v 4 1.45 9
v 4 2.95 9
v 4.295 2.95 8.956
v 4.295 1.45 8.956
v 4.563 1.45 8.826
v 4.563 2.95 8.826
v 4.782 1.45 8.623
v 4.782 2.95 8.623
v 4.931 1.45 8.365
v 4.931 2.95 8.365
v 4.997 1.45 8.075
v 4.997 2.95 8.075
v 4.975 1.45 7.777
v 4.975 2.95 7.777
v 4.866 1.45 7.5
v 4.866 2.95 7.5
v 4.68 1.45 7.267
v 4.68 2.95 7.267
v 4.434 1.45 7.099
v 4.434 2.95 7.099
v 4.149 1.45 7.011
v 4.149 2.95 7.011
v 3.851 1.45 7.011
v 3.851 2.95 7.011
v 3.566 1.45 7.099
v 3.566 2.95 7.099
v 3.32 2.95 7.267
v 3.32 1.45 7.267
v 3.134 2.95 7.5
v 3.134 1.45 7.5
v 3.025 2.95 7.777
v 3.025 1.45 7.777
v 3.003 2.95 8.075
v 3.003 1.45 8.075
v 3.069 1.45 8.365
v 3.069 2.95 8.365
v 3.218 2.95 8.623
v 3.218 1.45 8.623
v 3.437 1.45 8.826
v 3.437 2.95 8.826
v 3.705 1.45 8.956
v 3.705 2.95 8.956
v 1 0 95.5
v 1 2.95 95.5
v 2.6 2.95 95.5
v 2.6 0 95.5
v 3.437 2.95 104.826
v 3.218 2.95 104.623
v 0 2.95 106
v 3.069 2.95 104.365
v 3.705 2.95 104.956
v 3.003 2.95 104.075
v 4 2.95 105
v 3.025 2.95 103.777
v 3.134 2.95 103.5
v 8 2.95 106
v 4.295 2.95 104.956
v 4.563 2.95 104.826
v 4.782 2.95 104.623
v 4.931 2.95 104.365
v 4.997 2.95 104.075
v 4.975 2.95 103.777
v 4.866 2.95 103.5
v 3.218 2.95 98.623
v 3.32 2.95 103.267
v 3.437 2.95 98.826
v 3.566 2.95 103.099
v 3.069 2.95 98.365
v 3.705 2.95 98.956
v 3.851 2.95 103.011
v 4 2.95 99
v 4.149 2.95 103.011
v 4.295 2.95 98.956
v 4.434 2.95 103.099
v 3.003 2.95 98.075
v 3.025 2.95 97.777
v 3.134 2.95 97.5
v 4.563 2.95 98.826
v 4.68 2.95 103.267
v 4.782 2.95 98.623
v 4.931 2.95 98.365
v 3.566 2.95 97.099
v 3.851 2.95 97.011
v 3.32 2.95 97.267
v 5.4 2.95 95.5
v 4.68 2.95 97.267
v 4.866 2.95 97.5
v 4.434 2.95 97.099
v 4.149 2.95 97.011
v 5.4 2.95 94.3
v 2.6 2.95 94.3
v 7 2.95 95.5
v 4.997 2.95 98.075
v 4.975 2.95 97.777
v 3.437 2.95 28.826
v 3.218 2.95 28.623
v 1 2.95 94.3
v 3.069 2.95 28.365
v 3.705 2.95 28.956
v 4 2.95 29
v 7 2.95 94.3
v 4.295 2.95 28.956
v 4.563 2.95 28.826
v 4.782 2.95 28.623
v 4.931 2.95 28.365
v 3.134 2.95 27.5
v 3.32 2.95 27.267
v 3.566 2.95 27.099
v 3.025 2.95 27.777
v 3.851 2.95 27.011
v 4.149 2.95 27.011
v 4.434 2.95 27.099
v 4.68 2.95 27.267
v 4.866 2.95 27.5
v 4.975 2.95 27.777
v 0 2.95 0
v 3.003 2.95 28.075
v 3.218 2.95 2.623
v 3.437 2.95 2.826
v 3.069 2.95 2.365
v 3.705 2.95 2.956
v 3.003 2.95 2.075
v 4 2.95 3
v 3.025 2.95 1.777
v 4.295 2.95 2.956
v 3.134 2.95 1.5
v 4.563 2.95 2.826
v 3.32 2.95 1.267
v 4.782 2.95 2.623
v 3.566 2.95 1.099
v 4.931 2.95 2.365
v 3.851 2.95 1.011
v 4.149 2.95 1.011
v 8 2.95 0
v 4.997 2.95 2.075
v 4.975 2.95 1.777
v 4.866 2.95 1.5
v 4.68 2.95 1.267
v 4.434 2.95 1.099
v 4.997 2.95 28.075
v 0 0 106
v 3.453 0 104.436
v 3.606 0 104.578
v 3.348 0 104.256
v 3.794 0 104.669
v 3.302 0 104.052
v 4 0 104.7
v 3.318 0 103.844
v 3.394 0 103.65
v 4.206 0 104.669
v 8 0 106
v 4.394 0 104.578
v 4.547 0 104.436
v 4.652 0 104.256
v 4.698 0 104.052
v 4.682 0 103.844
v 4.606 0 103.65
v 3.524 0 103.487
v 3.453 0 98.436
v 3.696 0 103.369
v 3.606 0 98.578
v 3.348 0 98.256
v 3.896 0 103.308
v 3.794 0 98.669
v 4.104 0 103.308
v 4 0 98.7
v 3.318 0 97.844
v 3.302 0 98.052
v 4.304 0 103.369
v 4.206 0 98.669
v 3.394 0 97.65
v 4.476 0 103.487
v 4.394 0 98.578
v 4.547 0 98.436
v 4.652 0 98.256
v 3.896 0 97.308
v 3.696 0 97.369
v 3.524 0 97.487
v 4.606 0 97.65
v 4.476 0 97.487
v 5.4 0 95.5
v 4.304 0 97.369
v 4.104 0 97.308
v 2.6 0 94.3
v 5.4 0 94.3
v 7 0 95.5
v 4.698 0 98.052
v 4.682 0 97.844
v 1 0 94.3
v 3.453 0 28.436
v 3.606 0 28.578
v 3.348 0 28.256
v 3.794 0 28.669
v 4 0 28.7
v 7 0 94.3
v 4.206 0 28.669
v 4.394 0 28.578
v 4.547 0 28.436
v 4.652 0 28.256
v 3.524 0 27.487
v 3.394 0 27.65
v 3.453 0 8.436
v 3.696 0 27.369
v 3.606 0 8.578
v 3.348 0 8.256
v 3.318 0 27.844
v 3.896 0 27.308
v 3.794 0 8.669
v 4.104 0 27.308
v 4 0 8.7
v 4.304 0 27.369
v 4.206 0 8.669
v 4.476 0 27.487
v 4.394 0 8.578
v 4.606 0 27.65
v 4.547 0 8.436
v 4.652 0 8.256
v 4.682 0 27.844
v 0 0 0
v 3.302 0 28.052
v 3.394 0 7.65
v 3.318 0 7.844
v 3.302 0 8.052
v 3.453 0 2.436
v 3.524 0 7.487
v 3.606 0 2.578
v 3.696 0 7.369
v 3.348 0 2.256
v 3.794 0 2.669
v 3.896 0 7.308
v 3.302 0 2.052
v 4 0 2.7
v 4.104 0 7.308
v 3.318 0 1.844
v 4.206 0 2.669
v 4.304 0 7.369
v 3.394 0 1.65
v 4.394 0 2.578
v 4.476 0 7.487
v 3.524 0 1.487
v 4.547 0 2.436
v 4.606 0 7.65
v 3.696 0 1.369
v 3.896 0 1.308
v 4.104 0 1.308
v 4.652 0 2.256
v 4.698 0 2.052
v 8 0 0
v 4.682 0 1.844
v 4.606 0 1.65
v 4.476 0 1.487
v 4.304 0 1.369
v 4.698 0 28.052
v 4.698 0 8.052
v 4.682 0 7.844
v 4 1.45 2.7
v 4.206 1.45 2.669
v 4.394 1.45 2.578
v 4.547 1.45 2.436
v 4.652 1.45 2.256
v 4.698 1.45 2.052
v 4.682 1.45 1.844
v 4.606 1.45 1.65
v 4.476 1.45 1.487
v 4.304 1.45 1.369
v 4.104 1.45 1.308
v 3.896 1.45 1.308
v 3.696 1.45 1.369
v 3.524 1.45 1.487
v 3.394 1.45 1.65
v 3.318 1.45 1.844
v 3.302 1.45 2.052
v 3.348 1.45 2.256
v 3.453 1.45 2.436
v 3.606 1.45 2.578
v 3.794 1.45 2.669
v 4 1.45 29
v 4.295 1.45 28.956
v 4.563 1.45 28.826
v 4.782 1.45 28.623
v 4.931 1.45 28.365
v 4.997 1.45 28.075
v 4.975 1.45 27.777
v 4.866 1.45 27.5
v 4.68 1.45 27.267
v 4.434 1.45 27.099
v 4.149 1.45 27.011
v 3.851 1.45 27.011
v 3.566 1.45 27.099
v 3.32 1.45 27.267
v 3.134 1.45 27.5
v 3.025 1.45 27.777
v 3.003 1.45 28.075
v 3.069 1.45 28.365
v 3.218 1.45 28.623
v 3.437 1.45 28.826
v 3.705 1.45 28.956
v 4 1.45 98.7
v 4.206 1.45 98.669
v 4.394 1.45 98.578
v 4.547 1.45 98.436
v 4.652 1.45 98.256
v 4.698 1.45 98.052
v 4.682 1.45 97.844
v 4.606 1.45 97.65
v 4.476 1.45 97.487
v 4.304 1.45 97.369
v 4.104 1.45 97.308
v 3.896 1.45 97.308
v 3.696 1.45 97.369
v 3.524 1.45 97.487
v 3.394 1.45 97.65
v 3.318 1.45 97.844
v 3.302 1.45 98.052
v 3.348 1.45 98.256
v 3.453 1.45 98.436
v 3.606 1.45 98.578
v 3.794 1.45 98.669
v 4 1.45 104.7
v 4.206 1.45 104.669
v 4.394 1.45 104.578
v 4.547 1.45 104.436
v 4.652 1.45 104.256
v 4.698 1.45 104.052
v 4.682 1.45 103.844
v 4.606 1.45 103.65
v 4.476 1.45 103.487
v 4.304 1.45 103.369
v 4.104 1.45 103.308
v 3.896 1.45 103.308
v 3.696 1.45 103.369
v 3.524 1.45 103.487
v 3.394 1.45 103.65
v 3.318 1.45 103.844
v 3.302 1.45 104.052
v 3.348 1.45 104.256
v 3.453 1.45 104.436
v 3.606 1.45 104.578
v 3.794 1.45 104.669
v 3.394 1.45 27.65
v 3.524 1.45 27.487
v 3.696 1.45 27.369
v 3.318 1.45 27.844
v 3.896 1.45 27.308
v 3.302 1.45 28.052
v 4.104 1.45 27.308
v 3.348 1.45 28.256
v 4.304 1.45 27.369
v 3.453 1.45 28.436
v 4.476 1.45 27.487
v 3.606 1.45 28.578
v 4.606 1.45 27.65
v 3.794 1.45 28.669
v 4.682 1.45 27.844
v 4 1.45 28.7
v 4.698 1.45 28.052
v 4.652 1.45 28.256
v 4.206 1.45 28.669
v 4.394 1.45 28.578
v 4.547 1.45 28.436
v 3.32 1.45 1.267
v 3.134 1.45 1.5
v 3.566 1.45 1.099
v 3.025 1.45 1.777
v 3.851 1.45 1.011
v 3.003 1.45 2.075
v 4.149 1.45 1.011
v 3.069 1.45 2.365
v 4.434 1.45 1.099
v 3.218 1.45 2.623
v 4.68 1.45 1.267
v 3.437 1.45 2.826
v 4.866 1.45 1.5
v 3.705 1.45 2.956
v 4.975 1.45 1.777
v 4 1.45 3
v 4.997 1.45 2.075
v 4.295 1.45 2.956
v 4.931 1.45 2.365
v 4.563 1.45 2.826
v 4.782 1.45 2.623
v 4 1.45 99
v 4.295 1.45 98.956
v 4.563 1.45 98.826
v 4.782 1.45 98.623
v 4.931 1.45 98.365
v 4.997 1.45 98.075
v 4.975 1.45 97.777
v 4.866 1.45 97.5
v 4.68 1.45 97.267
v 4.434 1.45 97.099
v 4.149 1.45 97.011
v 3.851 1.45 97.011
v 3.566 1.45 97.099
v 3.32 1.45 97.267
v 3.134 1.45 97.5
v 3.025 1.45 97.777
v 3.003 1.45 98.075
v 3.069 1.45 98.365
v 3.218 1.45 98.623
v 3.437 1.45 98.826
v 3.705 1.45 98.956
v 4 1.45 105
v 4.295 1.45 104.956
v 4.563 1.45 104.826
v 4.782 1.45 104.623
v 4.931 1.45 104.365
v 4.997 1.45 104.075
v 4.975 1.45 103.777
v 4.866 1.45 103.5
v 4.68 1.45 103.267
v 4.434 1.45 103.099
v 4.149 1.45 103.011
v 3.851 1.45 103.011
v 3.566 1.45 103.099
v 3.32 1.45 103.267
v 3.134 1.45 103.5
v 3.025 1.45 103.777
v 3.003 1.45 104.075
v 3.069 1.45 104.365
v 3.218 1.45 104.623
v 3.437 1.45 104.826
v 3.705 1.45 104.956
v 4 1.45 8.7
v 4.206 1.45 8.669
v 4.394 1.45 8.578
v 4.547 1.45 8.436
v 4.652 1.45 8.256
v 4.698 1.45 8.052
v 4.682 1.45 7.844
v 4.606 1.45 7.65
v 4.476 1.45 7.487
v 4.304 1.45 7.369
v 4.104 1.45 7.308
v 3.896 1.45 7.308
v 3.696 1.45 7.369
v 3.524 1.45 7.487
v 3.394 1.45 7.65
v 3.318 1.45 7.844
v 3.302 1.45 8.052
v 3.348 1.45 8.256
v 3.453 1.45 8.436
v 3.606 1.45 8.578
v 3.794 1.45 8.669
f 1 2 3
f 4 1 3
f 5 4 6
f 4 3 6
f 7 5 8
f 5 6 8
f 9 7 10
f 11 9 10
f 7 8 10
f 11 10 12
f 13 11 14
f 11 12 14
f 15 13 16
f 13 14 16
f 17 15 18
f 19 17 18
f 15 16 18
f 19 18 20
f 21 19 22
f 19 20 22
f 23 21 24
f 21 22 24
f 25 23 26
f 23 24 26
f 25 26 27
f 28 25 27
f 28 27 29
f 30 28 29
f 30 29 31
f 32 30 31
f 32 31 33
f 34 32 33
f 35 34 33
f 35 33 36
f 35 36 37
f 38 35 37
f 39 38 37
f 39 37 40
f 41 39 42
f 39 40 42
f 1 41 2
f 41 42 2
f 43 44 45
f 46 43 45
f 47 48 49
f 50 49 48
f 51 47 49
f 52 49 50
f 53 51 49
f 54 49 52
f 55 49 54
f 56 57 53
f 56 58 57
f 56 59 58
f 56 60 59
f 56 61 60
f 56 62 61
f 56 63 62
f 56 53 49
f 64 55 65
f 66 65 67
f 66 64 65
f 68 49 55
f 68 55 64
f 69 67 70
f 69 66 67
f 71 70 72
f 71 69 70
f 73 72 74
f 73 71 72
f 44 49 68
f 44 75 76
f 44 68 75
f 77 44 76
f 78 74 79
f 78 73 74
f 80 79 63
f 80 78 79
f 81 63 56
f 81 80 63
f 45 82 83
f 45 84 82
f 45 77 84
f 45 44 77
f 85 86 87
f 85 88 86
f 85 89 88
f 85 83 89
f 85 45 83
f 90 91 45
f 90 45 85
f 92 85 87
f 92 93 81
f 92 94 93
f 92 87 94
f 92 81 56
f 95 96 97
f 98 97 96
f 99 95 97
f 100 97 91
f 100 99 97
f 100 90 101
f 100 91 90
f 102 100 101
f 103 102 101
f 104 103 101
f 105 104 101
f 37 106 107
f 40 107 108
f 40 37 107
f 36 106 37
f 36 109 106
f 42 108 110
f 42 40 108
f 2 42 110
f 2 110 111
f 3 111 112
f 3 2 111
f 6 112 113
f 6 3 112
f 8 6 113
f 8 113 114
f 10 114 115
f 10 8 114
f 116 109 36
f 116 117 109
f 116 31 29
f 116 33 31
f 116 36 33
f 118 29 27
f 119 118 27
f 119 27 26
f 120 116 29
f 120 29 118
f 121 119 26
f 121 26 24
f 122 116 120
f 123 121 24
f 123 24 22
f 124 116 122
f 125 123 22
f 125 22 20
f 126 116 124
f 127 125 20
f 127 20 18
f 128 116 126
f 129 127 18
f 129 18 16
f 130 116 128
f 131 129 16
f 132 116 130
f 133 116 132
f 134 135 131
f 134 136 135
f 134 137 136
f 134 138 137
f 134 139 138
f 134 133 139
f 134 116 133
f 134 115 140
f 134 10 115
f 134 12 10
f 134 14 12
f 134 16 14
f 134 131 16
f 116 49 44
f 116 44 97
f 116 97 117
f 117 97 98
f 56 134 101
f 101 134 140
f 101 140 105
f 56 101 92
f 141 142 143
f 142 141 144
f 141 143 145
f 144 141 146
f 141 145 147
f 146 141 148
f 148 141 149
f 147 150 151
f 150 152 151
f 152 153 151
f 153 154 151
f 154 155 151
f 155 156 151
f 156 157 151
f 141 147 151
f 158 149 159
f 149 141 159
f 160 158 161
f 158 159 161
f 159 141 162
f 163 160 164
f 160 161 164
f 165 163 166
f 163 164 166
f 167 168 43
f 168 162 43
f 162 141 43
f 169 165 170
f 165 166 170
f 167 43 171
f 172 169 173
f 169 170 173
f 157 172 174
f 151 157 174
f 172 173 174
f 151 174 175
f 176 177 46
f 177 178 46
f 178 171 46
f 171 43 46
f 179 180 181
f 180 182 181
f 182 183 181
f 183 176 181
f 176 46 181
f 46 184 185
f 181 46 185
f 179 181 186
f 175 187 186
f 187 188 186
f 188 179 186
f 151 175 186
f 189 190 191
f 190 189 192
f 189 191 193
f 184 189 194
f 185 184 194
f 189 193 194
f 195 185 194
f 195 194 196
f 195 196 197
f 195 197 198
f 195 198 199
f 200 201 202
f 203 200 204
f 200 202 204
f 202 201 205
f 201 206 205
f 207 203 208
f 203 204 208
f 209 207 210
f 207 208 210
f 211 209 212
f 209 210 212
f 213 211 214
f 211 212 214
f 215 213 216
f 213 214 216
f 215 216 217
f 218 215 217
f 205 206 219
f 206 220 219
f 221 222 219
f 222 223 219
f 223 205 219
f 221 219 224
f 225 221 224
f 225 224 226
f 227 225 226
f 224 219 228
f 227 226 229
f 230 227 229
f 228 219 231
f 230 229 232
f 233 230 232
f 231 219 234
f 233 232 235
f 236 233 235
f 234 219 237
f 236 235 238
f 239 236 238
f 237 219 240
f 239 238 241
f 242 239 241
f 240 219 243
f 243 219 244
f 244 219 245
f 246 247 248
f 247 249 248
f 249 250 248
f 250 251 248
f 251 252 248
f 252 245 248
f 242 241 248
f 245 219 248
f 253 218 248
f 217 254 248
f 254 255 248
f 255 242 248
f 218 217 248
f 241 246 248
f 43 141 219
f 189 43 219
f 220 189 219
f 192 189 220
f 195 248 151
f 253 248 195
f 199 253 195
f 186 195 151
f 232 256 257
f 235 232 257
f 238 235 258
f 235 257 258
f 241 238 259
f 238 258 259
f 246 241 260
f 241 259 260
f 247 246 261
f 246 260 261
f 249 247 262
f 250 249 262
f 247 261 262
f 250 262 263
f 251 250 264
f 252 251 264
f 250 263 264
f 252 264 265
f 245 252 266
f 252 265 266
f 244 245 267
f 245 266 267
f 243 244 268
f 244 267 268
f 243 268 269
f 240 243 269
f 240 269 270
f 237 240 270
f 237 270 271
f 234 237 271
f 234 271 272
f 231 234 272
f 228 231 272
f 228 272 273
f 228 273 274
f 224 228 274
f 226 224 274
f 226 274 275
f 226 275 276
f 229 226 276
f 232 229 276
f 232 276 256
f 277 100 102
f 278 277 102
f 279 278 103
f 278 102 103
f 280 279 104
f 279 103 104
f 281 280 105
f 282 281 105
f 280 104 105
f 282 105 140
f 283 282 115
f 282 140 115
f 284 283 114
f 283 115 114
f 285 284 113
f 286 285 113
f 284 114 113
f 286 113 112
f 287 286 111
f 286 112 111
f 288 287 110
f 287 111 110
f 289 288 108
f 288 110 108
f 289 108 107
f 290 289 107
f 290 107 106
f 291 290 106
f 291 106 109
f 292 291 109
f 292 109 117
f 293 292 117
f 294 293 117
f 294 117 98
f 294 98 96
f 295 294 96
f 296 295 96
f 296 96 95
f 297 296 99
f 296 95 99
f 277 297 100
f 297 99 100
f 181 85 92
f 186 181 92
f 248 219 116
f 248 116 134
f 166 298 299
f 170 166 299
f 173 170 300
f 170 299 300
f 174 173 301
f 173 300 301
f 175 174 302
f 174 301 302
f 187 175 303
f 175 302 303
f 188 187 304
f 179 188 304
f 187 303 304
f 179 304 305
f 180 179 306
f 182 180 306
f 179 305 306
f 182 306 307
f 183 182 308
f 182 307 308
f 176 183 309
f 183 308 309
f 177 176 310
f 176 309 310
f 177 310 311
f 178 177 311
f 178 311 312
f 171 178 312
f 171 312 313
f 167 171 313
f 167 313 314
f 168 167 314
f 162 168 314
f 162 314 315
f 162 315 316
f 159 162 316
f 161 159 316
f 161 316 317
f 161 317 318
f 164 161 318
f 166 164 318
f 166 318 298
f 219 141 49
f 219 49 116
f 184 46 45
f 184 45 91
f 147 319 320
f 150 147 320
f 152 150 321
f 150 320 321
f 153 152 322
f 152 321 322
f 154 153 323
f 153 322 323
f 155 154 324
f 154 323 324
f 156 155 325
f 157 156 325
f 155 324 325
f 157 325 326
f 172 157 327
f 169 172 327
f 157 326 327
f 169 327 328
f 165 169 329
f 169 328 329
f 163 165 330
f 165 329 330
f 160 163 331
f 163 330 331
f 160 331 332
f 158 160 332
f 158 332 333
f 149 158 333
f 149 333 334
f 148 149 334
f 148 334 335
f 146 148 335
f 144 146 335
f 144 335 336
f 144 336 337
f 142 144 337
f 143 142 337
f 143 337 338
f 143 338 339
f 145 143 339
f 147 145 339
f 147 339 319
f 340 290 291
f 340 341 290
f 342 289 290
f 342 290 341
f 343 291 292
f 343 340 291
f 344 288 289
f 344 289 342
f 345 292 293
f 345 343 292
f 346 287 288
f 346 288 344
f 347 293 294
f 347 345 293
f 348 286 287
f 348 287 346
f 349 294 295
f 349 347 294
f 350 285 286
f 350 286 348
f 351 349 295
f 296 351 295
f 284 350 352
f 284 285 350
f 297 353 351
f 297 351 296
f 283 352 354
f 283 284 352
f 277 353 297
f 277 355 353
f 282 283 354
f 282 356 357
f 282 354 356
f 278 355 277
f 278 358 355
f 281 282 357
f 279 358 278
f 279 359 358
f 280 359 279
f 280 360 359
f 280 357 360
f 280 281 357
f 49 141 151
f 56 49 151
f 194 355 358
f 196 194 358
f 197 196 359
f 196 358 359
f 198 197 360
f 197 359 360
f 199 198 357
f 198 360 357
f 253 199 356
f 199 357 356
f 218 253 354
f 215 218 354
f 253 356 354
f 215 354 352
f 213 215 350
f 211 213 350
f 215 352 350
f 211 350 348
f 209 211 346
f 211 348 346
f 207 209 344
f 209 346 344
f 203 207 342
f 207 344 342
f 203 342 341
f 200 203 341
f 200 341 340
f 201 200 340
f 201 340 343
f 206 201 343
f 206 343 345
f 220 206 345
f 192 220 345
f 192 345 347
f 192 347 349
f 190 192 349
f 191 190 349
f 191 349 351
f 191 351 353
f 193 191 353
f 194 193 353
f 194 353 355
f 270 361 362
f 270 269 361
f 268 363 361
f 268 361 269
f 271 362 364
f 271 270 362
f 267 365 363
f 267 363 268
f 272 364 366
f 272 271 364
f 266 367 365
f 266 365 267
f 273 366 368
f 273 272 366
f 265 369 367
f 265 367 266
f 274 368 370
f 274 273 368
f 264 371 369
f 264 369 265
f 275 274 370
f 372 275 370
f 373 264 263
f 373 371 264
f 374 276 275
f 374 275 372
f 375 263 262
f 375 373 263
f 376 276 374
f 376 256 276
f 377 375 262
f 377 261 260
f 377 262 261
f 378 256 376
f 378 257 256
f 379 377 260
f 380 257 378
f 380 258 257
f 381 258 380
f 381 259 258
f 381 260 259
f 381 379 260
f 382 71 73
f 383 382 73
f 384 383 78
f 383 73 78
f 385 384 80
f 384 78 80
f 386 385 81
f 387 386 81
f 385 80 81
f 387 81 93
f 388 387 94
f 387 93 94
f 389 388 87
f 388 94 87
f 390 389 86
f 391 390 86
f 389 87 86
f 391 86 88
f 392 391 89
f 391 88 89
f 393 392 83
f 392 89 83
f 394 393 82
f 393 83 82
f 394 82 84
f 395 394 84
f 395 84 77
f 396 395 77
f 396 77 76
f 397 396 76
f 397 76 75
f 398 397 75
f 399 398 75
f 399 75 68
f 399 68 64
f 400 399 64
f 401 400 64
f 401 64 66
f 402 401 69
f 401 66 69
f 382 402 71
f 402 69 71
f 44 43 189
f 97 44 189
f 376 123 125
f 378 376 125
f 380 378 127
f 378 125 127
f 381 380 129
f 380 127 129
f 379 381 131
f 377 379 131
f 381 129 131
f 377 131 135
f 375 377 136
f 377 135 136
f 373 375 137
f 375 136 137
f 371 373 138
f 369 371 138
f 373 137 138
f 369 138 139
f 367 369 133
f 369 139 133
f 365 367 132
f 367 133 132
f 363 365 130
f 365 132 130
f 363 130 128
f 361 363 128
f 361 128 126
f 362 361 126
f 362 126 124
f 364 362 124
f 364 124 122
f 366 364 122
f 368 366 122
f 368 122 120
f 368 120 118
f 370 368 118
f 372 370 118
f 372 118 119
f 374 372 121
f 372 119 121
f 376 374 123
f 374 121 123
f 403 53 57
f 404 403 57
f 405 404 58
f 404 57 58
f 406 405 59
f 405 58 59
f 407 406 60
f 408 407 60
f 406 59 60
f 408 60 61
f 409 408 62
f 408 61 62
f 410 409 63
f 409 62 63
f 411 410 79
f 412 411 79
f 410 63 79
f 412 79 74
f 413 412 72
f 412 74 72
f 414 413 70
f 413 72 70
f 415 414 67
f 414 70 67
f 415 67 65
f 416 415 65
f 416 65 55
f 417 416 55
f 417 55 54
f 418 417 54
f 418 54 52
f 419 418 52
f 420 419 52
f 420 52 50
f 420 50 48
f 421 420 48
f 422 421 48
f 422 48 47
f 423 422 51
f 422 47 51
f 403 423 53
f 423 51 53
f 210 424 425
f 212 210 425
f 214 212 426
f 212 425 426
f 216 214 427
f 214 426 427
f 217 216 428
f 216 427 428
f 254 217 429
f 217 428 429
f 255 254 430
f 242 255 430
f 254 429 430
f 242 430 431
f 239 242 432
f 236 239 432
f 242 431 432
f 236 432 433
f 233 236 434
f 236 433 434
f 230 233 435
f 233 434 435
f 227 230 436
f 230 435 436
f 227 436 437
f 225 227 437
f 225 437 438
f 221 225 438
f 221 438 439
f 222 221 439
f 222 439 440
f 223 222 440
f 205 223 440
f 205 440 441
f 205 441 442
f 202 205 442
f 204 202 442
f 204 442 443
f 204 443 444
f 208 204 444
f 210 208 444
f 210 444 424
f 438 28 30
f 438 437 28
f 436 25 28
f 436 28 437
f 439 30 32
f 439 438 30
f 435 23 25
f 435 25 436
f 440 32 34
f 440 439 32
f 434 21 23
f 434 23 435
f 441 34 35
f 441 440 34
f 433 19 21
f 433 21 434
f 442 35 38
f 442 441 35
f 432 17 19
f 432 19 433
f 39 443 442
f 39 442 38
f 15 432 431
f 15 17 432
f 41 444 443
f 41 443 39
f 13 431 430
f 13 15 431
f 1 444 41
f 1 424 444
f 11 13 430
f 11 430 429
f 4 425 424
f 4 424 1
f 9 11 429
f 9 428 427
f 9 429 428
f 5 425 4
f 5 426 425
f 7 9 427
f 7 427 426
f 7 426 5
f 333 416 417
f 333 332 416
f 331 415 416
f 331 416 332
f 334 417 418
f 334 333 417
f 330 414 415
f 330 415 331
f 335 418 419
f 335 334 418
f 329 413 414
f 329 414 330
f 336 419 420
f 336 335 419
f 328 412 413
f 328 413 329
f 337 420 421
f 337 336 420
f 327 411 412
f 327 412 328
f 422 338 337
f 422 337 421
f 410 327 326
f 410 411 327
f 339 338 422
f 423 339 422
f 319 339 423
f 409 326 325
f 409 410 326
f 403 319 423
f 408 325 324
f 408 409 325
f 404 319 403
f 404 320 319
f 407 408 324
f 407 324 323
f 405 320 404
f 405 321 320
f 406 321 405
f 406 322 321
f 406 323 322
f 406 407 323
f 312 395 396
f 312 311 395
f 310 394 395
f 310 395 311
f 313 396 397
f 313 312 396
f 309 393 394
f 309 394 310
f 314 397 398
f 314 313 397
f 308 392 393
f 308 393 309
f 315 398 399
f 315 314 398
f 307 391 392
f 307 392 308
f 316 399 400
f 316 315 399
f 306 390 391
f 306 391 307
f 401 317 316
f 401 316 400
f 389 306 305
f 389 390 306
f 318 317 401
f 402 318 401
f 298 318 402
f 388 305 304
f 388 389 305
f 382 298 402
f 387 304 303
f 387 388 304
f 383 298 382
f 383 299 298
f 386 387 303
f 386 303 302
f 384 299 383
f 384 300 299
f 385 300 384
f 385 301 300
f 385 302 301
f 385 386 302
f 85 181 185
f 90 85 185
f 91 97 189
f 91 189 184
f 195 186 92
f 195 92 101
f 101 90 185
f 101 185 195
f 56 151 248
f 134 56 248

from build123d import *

# Parameters (mm, degrees)
SKETCH_1_W          = 8
SKETCH_1_H          = 106
EXTRUDE_1_DEPTH     = 2.95
SKETCH_2_R          = 0.7
CUT_EXTRUDE_1_DEPTH = 107.342383366
SKETCH_2_3_R        = 1
CUT_EXTRUDE_2_DEPTH = 1.5
SKETCH_3_W          = 1.6
SKETCH_3_H          = 1.2
CUT_EXTRUDE_3_DEPTH = 107.342383366


with BuildPart() as part:
    # 草图1 → 凸台-拉伸1 (new body)
    with BuildSketch(Plane(origin=(0, 0, 0), x_dir=(1, 0, 0), z_dir=(0, 1, 0))):
        with Locations((4, -53)):
            Rectangle(SKETCH_1_W, SKETCH_1_H)
    extrude(amount=EXTRUDE_1_DEPTH)

    # 草图2 → 切除-拉伸1 (cut, through all)
    with BuildSketch(Plane(origin=(0, 2.95, 0), x_dir=(1, 0, 0), z_dir=(0, 1, 0))):
        with Locations((4, -8)):
            Circle(SKETCH_2_R)
        with Locations((4, -2)):
            Circle(SKETCH_2_R)
        with Locations((4, -104)):
            Circle(SKETCH_2_R)
        with Locations((4, -98)):
            Circle(SKETCH_2_R)
        with Locations((4, -28)):
            Circle(SKETCH_2_R)
    extrude(amount=-CUT_EXTRUDE_1_DEPTH, mode=Mode.SUBTRACT)

    # 草图2<3> → 切除-拉伸2 (cut)
    with BuildSketch(Plane(origin=(0, 2.95, 0), x_dir=(1, 0, 0), z_dir=(0, 1, 0))):
        with Locations((4, -8)):
            Circle(SKETCH_2_3_R)
        with Locations((4, -2)):
            Circle(SKETCH_2_3_R)
        with Locations((4, -104)):
            Circle(SKETCH_2_3_R)
        with Locations((4, -98)):
            Circle(SKETCH_2_3_R)
        with Locations((4, -28)):
            Circle(SKETCH_2_3_R)
    extrude(amount=-CUT_EXTRUDE_2_DEPTH, mode=Mode.SUBTRACT)

    # 草图3 → 切除-拉伸3 (cut, through all)
    with BuildSketch(Plane(origin=(0, 2.95, 0), x_dir=(1, 0, 0), z_dir=(0, 1, 0))):
        with Locations((1.8, -94.9)):
            Rectangle(SKETCH_3_W, SKETCH_3_H)
        with Locations((6.2, -94.9)):
            Rectangle(SKETCH_3_W, SKETCH_3_H)
    extrude(amount=-CUT_EXTRUDE_3_DEPTH, mode=Mode.SUBTRACT)


solid = part.part
